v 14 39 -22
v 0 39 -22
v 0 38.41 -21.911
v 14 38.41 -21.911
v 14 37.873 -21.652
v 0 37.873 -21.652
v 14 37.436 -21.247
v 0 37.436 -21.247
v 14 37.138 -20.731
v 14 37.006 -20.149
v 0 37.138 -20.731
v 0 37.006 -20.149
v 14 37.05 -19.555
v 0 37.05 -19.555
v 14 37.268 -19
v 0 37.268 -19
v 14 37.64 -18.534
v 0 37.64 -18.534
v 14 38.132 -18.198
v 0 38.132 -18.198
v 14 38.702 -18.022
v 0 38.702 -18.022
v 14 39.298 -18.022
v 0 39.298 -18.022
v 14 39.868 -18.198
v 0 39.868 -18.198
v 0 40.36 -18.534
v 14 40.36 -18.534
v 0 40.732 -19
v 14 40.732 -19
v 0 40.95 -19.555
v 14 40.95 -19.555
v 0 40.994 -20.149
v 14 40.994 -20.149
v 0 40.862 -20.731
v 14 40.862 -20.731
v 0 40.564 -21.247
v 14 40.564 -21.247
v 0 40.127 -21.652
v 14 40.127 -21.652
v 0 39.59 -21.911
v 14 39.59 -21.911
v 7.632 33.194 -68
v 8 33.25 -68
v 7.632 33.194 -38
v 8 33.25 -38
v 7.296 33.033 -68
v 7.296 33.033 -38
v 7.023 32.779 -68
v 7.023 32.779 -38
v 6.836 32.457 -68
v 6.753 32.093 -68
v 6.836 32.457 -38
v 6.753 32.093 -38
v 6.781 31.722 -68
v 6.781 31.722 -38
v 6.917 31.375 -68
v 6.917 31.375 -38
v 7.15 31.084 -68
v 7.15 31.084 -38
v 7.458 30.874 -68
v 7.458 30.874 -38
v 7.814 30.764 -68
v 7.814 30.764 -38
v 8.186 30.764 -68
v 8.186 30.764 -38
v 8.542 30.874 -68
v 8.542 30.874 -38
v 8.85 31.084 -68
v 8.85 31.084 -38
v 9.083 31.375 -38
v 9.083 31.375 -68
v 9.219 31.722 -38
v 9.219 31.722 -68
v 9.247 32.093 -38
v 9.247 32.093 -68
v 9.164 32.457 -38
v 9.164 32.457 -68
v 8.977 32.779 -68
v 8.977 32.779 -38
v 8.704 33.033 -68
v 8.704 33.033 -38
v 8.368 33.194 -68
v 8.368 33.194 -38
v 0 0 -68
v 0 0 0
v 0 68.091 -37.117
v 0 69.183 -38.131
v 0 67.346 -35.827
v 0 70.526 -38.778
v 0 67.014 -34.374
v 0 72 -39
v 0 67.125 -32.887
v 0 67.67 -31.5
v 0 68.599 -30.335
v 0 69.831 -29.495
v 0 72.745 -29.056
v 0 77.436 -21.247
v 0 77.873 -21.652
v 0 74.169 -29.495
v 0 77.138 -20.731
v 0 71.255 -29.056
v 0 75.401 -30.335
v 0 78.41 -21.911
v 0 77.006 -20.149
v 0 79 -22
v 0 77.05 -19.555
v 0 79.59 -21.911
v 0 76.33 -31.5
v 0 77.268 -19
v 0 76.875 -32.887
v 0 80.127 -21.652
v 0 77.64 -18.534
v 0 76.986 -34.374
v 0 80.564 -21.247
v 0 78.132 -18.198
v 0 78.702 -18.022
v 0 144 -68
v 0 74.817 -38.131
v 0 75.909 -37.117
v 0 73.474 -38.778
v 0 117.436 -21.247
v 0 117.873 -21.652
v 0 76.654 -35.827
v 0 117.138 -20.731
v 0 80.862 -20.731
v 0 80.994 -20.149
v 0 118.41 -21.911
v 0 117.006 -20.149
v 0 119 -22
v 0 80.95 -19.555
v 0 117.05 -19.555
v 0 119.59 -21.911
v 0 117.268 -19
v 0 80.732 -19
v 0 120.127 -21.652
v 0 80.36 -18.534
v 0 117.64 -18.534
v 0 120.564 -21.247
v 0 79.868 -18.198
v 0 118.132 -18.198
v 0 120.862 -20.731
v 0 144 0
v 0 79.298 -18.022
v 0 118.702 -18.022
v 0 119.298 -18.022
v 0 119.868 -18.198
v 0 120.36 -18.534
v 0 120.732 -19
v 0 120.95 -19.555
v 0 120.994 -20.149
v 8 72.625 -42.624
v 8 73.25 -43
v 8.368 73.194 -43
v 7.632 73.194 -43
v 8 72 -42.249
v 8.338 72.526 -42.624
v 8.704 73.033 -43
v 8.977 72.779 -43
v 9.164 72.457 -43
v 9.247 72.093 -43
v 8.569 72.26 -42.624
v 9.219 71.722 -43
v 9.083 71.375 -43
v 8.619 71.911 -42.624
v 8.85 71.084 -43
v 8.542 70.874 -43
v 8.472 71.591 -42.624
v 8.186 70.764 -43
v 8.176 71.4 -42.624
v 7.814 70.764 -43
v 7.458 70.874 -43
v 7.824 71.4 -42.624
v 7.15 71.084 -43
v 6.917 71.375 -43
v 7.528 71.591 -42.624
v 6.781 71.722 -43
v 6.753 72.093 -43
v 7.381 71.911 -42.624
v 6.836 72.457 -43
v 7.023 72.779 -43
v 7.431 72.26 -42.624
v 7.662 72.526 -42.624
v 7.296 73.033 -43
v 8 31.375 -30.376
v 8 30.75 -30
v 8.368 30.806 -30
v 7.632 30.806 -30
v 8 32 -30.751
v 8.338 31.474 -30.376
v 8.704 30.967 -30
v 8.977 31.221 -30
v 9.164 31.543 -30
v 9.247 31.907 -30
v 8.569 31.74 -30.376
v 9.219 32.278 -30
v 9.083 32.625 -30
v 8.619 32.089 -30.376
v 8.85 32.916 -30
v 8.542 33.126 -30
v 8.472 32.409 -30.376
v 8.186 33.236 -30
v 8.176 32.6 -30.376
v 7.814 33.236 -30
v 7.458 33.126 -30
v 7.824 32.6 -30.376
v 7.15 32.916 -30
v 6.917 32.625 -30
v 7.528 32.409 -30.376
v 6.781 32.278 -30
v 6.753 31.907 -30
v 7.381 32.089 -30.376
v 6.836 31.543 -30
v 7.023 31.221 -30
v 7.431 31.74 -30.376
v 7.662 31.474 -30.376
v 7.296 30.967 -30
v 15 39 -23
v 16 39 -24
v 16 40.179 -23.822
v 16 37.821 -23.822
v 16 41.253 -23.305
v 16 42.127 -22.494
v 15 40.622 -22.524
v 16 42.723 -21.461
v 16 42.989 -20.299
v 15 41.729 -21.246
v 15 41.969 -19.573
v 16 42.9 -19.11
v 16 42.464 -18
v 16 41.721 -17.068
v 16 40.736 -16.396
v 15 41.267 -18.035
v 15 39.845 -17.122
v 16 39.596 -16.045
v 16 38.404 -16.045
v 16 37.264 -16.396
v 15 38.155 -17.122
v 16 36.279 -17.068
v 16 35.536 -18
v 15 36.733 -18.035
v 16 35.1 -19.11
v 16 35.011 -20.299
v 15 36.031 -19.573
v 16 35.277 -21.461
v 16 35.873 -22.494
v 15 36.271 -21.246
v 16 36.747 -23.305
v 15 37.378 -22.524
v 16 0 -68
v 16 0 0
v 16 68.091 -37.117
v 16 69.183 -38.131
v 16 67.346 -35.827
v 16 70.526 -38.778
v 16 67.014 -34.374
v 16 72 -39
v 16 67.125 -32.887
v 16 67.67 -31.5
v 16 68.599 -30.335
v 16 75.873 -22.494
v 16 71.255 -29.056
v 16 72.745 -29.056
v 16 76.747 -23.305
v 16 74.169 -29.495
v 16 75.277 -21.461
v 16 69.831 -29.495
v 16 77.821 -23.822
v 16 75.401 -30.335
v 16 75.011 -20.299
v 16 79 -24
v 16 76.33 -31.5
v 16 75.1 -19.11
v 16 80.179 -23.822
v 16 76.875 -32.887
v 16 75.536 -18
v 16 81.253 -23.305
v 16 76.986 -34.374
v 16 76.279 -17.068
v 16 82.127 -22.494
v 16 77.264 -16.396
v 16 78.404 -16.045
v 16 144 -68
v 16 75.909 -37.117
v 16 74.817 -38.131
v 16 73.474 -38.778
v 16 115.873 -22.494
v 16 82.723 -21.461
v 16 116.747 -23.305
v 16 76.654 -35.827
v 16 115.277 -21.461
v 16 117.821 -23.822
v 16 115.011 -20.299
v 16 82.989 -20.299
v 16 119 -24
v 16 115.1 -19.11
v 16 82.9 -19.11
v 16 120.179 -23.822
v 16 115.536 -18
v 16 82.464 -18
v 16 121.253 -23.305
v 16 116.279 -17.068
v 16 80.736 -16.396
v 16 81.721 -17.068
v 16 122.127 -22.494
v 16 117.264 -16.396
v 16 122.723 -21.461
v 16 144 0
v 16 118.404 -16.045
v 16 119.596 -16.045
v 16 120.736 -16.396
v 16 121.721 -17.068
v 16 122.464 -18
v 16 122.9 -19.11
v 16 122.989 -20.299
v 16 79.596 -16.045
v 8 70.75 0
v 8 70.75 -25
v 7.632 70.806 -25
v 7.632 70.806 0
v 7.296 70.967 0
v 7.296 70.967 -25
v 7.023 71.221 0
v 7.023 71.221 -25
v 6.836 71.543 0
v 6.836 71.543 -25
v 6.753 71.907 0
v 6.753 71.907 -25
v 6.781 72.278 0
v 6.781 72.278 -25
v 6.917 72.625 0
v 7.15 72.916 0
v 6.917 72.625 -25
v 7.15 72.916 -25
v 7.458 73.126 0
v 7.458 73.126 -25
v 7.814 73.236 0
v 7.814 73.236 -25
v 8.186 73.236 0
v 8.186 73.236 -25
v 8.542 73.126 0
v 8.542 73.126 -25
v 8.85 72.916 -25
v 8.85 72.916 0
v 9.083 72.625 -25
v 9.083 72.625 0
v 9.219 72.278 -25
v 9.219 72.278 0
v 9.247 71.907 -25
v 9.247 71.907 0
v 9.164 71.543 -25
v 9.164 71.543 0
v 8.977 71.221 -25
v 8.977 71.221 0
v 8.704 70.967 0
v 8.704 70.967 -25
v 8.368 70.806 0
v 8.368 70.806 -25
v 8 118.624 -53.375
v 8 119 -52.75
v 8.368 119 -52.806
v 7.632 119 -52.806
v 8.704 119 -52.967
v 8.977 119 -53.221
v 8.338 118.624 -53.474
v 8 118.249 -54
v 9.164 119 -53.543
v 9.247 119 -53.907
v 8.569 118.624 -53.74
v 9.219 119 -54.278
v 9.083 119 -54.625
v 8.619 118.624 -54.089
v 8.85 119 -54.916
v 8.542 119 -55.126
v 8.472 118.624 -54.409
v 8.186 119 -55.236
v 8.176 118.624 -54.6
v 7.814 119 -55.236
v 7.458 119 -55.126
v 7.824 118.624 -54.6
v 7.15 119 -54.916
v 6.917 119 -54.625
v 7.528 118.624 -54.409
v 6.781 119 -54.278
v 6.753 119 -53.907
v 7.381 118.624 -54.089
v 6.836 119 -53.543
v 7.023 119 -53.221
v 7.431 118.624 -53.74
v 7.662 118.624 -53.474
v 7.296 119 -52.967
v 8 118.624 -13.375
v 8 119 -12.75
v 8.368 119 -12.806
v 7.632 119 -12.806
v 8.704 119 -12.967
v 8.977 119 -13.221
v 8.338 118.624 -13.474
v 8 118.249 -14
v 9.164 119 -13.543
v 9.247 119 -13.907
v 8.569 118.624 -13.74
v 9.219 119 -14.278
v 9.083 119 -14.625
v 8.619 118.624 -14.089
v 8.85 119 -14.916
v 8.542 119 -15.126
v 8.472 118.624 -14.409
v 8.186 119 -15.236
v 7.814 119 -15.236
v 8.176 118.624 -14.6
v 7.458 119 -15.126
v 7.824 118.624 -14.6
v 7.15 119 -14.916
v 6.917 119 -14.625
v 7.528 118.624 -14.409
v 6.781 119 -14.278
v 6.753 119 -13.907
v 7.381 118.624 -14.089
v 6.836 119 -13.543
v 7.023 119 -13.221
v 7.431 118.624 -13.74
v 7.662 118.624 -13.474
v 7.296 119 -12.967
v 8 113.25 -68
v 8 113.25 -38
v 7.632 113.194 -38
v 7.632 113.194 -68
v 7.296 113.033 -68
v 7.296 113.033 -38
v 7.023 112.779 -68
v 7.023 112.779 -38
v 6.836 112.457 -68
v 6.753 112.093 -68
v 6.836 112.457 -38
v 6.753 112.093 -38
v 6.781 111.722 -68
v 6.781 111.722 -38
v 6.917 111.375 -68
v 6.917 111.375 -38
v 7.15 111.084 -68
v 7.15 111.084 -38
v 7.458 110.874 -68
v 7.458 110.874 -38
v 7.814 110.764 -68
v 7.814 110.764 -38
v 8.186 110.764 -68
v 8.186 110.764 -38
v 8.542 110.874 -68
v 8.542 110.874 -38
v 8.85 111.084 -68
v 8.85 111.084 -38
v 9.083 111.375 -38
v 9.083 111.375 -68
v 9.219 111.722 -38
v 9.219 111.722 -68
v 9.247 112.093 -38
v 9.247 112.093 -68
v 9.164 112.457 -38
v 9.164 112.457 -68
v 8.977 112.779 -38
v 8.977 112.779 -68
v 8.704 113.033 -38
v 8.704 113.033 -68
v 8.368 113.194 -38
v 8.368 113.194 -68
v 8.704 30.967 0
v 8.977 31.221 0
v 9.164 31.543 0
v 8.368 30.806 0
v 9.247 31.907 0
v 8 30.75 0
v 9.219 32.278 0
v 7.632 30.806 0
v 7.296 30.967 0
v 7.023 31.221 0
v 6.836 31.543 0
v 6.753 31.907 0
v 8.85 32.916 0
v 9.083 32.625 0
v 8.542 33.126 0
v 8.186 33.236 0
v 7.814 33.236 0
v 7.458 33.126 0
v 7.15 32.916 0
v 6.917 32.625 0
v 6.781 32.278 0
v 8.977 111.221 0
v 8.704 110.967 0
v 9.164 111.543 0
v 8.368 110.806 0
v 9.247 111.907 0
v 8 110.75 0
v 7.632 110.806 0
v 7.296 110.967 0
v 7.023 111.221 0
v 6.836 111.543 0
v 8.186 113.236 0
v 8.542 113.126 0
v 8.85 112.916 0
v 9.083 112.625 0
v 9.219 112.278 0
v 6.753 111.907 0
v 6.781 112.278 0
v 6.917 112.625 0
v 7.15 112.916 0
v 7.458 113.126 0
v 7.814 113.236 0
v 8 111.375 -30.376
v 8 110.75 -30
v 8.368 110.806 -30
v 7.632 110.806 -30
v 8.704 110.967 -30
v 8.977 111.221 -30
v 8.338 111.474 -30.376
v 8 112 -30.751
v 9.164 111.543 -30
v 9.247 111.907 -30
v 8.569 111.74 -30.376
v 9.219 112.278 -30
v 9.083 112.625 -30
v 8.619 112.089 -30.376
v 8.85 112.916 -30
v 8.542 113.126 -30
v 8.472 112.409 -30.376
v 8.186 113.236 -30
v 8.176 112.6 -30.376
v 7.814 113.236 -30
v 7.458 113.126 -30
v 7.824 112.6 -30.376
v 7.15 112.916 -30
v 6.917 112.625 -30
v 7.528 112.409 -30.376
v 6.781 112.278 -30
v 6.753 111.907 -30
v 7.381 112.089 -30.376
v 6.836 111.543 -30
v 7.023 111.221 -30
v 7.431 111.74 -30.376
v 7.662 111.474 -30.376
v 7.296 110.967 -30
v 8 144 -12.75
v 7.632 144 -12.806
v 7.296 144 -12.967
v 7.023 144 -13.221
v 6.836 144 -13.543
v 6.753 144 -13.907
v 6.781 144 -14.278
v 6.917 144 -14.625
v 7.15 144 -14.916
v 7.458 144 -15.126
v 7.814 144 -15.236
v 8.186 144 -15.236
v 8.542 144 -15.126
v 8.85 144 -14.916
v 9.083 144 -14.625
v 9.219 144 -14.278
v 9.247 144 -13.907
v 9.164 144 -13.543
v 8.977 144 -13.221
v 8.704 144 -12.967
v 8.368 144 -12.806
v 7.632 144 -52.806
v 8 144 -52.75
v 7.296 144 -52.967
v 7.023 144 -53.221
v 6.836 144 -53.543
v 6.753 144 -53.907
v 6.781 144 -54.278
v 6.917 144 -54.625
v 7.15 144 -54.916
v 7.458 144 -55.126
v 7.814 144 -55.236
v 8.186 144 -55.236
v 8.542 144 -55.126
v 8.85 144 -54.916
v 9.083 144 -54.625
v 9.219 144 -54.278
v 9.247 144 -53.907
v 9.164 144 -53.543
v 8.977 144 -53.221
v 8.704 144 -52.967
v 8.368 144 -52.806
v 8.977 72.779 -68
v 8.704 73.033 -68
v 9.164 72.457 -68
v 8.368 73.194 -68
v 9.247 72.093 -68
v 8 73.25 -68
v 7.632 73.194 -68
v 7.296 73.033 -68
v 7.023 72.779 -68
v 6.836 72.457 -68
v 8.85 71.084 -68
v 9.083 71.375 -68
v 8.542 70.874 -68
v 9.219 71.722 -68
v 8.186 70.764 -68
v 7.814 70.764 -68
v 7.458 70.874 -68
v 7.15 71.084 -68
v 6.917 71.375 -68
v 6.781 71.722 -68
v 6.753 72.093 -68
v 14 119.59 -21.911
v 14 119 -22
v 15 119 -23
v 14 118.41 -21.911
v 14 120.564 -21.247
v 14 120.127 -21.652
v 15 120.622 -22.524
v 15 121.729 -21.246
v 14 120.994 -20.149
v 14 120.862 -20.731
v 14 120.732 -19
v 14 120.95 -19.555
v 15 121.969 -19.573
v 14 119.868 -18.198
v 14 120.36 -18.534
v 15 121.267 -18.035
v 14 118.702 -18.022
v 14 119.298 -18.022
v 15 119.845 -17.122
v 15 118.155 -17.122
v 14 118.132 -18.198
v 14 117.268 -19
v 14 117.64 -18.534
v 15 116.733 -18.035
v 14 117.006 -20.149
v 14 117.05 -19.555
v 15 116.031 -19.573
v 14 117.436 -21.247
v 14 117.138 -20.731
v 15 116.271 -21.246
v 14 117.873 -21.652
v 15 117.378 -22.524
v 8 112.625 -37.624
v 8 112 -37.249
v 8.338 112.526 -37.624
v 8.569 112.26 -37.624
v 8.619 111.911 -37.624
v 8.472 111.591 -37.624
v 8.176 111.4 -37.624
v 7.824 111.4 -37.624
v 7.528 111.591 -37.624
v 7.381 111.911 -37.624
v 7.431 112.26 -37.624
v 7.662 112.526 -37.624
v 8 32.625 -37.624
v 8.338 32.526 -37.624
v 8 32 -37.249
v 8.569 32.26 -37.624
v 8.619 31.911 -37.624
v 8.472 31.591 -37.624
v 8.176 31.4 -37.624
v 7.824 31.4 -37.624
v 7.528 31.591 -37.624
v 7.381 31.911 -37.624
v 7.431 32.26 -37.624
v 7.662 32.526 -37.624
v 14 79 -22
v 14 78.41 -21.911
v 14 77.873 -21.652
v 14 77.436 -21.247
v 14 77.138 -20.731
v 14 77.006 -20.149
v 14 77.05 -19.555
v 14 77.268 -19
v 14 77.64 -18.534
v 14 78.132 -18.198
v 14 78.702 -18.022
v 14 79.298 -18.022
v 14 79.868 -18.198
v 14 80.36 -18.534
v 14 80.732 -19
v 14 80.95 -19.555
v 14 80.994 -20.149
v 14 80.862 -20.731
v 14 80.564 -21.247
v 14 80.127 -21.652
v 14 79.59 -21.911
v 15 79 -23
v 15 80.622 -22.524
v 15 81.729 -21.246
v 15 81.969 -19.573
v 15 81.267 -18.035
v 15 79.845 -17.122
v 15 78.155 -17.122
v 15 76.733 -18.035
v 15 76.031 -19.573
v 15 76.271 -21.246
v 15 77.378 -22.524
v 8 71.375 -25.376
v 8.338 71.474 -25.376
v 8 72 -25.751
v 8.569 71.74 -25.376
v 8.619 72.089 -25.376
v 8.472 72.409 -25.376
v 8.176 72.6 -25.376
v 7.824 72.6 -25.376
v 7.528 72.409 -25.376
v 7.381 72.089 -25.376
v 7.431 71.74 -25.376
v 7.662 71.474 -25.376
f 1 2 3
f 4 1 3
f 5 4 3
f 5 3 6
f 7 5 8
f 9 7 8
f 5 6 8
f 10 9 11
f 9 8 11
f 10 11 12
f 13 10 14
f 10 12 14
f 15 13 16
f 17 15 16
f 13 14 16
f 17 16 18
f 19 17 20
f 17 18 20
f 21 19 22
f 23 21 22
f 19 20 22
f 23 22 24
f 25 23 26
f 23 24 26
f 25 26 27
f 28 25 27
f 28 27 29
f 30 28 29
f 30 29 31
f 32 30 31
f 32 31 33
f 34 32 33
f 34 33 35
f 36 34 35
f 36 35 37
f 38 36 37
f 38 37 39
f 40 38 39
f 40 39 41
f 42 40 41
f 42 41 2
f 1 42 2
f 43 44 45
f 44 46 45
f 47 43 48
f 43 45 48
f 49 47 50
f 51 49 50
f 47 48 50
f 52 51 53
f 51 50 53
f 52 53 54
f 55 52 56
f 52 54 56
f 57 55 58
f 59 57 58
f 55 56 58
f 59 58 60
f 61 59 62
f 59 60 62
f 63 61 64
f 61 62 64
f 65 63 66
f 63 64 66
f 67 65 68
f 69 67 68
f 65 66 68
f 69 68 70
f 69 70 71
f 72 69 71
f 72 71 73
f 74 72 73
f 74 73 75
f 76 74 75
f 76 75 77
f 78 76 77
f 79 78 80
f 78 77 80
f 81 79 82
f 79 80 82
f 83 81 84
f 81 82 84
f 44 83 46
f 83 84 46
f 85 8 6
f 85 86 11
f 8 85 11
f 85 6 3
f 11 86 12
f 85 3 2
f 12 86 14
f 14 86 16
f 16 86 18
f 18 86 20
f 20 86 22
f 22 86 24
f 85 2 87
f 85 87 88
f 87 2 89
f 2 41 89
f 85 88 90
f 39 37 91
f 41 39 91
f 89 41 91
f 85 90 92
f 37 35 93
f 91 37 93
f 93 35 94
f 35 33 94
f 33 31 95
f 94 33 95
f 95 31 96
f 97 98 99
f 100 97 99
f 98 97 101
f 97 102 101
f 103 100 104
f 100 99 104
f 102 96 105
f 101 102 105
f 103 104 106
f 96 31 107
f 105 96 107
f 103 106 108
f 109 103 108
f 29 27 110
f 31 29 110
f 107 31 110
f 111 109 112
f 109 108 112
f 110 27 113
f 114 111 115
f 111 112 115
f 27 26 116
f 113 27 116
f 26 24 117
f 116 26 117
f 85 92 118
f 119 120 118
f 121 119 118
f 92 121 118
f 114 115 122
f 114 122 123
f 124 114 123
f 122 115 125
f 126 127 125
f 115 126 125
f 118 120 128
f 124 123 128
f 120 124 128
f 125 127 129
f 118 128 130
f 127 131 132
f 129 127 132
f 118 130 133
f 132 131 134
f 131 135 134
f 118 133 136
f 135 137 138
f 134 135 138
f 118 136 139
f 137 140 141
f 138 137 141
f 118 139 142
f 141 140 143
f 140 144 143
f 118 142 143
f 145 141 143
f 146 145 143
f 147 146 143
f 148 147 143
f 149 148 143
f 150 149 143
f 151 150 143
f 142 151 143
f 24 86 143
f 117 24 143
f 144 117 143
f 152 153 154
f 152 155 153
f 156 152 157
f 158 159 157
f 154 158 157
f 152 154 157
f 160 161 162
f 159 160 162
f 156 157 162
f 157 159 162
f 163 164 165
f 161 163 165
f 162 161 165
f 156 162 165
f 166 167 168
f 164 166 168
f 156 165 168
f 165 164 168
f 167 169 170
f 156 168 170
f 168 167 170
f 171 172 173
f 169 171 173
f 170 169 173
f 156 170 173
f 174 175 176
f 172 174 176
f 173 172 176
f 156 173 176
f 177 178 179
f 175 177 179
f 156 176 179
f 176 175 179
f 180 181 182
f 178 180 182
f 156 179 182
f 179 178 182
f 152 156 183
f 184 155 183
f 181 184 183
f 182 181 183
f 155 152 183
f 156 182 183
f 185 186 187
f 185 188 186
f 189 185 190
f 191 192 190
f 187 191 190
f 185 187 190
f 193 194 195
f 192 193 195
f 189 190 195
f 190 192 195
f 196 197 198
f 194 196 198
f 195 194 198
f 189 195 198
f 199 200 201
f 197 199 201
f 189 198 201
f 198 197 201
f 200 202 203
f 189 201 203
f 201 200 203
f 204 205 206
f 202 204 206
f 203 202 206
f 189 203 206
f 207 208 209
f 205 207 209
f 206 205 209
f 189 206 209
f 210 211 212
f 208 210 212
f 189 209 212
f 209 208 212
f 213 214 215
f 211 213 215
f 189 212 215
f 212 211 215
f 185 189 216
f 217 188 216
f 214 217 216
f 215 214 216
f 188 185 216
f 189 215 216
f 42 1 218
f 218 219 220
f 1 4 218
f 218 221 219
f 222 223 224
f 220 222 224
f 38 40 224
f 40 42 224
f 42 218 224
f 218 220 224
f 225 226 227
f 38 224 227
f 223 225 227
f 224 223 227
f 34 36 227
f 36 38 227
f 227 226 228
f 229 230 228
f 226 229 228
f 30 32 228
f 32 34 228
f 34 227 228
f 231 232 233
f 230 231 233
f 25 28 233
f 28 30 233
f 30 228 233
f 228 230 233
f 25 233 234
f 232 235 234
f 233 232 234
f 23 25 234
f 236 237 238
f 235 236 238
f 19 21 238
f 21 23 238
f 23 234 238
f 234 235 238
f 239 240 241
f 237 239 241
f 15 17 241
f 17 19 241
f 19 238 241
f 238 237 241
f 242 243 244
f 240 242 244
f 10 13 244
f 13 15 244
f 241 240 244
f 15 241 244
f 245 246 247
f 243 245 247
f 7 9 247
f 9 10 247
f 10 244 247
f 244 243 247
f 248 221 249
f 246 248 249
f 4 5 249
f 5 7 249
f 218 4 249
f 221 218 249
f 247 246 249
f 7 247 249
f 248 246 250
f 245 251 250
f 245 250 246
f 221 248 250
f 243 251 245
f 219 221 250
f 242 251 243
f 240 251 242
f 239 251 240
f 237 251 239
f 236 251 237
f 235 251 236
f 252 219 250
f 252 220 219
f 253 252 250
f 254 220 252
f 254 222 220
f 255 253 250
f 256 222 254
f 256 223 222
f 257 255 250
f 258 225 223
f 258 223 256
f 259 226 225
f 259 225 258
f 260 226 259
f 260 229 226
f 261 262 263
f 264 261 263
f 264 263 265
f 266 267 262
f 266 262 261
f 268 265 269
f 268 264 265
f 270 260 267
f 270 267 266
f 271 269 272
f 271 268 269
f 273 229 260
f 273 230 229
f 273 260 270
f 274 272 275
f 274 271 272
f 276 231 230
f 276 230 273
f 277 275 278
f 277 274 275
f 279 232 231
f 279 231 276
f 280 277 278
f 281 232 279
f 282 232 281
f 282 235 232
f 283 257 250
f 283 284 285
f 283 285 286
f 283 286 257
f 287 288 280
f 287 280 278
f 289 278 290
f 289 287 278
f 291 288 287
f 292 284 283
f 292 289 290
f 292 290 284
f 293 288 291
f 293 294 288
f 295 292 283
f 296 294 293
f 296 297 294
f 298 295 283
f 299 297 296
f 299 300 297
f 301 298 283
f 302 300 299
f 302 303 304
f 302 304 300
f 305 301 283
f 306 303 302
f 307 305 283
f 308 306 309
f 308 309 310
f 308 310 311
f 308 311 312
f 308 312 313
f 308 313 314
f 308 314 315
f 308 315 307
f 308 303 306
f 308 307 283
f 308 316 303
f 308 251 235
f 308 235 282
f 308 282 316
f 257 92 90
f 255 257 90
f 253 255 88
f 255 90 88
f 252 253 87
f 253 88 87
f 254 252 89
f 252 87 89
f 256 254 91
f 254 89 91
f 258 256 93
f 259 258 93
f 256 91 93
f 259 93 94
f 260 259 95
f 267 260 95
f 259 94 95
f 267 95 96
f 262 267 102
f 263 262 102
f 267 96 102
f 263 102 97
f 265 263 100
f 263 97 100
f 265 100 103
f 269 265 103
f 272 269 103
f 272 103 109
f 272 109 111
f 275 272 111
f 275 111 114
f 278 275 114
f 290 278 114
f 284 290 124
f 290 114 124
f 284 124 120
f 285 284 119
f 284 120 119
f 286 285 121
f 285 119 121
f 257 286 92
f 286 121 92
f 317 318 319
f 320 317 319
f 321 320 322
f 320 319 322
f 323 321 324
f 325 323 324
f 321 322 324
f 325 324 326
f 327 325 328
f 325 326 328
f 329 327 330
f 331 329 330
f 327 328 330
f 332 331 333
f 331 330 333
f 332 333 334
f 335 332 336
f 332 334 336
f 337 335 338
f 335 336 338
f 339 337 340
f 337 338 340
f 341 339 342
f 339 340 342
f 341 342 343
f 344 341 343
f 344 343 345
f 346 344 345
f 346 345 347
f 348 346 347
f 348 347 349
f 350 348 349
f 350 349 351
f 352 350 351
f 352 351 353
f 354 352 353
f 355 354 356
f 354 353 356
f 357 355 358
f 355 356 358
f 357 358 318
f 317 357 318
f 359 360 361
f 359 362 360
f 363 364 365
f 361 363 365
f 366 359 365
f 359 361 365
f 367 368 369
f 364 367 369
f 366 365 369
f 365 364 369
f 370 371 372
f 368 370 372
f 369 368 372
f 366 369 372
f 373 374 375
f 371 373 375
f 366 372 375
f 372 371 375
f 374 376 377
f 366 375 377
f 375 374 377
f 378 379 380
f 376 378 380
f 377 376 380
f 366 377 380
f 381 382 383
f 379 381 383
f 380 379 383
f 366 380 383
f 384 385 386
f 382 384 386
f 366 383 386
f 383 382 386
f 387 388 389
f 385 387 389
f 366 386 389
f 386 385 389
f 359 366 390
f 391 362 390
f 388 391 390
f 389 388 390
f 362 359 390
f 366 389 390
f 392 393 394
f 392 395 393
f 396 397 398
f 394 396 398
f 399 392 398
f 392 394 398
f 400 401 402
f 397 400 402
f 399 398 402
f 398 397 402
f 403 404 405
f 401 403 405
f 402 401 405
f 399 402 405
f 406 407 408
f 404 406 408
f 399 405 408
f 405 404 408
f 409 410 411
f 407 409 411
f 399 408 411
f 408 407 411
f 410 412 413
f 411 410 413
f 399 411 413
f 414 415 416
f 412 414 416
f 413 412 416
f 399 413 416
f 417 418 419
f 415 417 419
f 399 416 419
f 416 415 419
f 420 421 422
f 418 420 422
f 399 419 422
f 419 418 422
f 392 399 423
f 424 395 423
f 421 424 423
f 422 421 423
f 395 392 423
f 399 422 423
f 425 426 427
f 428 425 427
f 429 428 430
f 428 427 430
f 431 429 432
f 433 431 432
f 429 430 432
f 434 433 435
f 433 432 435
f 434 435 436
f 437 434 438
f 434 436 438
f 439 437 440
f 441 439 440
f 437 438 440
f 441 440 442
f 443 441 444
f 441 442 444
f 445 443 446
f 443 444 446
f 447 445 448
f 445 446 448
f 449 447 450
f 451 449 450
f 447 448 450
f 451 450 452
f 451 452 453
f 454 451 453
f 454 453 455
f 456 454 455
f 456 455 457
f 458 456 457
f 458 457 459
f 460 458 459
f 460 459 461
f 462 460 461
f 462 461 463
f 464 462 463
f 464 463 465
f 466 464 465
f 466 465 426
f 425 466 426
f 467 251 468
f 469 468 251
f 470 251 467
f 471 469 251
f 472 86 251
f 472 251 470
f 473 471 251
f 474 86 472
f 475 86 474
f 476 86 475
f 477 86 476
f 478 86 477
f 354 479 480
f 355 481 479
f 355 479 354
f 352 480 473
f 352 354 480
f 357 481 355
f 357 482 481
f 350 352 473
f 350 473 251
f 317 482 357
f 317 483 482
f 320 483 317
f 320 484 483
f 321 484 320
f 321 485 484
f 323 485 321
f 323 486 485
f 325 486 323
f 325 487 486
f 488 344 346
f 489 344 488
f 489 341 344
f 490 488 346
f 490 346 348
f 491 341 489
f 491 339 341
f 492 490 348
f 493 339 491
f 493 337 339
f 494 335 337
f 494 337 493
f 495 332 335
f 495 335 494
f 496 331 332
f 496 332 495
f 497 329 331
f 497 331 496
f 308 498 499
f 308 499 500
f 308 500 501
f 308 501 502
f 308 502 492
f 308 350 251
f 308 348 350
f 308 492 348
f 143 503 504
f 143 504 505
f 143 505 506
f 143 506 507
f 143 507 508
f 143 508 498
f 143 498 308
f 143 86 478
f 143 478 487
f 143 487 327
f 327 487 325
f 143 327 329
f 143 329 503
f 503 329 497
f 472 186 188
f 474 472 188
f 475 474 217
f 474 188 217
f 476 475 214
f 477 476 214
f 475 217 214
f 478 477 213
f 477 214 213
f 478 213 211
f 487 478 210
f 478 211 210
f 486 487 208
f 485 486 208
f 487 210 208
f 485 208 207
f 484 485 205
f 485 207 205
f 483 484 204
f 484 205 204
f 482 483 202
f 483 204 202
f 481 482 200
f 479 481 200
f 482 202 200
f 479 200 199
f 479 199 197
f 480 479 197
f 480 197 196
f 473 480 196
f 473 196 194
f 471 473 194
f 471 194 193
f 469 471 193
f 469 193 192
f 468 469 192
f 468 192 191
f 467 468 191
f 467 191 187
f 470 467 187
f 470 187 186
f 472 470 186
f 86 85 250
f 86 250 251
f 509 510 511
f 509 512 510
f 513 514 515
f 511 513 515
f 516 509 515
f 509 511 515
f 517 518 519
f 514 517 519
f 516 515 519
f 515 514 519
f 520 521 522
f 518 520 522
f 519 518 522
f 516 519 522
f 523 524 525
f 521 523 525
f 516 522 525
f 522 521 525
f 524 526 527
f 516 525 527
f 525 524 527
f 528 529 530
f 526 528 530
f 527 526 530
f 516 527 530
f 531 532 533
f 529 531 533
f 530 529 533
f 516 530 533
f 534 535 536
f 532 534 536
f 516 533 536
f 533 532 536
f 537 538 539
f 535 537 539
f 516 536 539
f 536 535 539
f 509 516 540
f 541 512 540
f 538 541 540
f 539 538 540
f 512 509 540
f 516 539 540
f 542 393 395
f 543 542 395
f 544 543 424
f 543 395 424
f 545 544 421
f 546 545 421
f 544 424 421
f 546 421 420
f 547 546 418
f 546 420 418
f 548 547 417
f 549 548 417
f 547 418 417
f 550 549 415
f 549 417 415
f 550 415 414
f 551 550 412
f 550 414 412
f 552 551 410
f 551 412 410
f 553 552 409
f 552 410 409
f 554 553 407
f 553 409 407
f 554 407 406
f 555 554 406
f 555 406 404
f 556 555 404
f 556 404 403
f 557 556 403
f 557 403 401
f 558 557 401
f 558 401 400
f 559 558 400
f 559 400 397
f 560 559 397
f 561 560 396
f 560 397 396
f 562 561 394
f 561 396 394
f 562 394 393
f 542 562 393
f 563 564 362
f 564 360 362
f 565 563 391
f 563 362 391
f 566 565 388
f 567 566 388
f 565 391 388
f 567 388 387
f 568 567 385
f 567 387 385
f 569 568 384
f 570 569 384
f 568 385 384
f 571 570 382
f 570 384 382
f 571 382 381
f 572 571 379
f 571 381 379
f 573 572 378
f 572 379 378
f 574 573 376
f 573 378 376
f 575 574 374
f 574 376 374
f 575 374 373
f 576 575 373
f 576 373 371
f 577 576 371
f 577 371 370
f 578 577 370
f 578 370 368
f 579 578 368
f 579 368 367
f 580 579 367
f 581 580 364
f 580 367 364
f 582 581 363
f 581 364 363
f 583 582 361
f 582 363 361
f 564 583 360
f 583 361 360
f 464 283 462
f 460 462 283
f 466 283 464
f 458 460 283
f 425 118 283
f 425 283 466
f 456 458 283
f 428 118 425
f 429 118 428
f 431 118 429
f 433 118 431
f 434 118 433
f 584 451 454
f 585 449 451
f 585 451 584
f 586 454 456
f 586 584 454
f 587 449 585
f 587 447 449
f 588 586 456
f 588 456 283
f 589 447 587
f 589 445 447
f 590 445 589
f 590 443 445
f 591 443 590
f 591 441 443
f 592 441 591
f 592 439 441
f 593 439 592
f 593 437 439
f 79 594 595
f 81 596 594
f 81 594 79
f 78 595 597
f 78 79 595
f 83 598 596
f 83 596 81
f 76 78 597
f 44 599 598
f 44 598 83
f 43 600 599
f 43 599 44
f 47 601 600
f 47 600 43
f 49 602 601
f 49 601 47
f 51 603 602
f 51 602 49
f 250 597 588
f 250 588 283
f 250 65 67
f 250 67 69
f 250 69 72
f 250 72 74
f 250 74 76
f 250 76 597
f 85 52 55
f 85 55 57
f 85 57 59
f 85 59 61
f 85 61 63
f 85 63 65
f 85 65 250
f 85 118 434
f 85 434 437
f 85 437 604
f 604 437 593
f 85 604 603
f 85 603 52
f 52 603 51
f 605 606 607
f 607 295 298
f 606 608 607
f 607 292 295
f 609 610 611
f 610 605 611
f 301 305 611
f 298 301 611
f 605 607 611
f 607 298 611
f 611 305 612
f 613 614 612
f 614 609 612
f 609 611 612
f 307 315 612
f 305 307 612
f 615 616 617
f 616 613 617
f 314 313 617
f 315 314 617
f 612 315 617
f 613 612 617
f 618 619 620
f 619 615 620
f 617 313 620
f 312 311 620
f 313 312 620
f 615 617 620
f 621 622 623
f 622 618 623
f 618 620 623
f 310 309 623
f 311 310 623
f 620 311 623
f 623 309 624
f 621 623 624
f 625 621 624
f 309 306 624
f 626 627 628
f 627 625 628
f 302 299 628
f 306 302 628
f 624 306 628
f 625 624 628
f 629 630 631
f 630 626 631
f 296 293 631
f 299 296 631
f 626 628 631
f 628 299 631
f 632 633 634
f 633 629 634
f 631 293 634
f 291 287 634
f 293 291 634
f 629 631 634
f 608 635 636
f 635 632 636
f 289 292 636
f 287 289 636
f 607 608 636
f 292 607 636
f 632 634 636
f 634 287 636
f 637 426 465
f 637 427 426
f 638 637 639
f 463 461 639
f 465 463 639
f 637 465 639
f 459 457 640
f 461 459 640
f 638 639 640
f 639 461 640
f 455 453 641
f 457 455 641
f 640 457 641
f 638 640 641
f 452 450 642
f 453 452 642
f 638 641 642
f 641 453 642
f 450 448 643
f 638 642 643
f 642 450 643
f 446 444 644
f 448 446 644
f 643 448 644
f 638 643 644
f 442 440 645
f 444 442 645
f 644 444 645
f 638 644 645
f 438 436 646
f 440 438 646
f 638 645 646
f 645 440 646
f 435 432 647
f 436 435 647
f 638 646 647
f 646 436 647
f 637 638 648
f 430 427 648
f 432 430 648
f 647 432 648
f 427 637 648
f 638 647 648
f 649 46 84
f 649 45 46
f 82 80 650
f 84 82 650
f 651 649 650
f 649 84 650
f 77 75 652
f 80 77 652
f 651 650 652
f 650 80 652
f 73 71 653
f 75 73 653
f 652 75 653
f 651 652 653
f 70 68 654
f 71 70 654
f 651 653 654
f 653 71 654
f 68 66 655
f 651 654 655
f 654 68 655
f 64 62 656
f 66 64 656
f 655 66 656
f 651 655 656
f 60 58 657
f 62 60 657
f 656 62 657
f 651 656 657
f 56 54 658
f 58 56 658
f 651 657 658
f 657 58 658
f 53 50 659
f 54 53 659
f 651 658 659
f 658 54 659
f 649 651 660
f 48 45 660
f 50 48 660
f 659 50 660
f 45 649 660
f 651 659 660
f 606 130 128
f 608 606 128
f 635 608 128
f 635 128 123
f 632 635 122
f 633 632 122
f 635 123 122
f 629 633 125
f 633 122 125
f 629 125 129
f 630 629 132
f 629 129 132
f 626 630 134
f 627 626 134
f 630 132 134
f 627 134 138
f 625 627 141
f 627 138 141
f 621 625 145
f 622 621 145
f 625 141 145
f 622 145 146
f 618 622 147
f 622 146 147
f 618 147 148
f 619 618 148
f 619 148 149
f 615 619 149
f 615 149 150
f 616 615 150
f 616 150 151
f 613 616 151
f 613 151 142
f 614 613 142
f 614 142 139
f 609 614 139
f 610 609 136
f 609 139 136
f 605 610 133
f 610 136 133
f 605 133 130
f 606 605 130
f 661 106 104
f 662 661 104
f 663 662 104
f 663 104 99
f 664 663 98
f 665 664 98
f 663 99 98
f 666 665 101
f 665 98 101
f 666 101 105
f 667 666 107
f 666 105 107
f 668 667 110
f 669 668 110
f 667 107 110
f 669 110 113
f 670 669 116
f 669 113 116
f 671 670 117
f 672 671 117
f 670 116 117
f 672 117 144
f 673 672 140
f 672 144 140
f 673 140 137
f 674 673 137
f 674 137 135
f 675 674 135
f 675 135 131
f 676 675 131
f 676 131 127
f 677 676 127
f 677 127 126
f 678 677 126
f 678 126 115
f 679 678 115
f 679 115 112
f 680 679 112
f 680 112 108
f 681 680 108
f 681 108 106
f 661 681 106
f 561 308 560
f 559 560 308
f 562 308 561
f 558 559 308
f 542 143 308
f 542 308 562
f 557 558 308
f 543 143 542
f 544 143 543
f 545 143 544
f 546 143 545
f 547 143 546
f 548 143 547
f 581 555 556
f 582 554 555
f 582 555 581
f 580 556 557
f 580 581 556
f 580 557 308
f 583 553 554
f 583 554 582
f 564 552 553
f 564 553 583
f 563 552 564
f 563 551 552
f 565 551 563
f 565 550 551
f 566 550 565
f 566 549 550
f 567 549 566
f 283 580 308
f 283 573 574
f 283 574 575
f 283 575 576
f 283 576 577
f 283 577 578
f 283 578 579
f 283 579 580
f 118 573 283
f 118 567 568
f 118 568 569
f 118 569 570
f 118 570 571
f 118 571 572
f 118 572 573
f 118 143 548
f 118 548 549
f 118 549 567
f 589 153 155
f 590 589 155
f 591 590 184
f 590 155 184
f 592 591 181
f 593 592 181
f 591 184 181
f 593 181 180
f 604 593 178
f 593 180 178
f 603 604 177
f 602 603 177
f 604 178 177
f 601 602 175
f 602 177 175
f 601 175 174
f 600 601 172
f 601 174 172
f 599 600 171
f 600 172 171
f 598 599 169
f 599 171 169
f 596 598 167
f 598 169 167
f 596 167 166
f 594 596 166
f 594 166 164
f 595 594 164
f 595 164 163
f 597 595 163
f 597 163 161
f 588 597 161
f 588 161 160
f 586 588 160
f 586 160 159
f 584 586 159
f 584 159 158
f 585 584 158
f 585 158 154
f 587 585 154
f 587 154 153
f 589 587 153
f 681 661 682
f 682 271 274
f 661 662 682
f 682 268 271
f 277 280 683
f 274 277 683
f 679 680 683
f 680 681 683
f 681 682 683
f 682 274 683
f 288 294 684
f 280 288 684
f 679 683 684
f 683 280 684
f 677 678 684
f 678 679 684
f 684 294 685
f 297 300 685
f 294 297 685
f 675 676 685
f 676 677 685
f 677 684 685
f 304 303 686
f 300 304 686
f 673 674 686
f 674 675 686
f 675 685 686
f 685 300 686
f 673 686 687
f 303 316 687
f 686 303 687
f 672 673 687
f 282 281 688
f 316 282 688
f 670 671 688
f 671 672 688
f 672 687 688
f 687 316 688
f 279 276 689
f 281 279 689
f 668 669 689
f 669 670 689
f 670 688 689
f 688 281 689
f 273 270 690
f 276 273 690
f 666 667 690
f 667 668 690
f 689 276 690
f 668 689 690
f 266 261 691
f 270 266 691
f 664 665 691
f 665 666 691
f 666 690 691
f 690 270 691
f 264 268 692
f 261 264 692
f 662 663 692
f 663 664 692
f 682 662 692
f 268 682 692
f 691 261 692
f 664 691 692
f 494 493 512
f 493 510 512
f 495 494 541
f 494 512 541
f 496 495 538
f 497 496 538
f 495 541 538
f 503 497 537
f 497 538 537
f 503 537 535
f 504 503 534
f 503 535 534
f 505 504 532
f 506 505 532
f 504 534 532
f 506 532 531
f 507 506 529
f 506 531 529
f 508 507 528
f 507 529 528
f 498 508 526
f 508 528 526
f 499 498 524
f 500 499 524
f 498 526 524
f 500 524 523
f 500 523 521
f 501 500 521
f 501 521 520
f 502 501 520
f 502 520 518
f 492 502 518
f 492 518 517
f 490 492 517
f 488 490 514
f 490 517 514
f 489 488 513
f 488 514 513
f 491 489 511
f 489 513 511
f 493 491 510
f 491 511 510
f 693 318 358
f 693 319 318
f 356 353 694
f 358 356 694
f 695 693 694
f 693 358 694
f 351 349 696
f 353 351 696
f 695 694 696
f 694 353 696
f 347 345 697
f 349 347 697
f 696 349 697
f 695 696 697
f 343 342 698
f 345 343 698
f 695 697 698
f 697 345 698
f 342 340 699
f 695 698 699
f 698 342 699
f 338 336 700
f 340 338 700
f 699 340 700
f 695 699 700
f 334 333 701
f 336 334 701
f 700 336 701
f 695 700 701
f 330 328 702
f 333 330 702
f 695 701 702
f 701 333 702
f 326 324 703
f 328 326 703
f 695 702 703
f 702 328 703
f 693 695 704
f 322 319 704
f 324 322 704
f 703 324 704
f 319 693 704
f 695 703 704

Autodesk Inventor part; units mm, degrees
ref_plane "YZ Plane" through (0, 0, 0) normal (1, 0, 0) x (0, 1, 0)
ref_plane "XZ Plane" through (0, 0, 0) normal (0, 1, 0) x (-1, 0, 0)
ref_plane "XY Plane" through (0, 0, 0) normal (0, 0, 1) x (1, 0, 0)
sketch "Skizze1" plane through (0, 0, 0) normal (1, 0, 0) x (0, 1, 0)
  line L0 (0, 0) -> (144, 0)
  line L1 (144, 0) -> (144, -68)
  line L2 (144, -68) -> (0, -68)
  line L3 (0, -68) -> (0, 0)
  dimension "d0" = 144
  dimension "d1" = 68
extrude "Extrusion1" add sketch "Skizze1" along normal blind 16
sketch "Skizze2" plane through (0, 0, 0) normal (0, 0, 1) x (1, 0, 0)
  line L0 (0, 0) -> (0, 144) construction
  line L1 (0, 72) -> (16, 72) construction
  line L2 (16, 144) -> (16, 0) construction
  line L3 (0, 144) -> (16, 144) construction
  line L4 (8, 144) -> (8, 0) construction
  line L5 (0, 144) -> (16, 144) construction
  line L6 (0, 0) -> (16, 0) construction
  line L7 (0, 144) -> (16, 144) construction
  line L8 (16, 144) -> (16, 0) construction
  line L9 (16, 0) -> (0, 0) construction
  line L10 (0, 0) -> (0, 144) construction
  line L11 (0, 112) -> (16, 112) construction
  line L12 (0, 32) -> (16, 32) construction
  point P0 (8, 112)
  point P1 (8, 72)
  point P2 (8, 32)
  dimension "d4" = 40
  dimension "d5" = 40
hole "Bohrung1" at (8, 112, 0) at (8, 32, 0) direction (0, 0, -1) diameter 2.5 depth 30 tip angle 118
sketch "Skizze3" plane through (0, 144, 0) normal (0, 1, 0) x (1, 0, 0)
  line L0 (0, 0) -> (16, 0)
  line L1 (16, 0) -> (16, 68)
  line L2 (16, 68) -> (0, 68)
  line L3 (0, 68) -> (0, 0)
  line L4 (8, 0) -> (8, 68) construction
  line L5 (0, 68) -> (16, 68) construction
  line L6 (16, 0) -> (16, 68) construction
  line L7 (16, 34) -> (0, 34) construction
  line L8 (0, 68) -> (0, 0) construction
  line L9 (0, 14) -> (16, 14) construction
  line L10 (0, 54) -> (16, 54) construction
  point P0 (8, 14)
  point P1 (8, 54)
  dimension "d13" = 14
  dimension "d22" = 14
hole "Bohrung2" at (8, 144, -14) at (8, 144, -54) direction (0, -1, 0) diameter 2.5 depth 25 tip angle 118
sketch "Skizze4" plane through (0, 0, -68) normal (0, 0, -1) x (-1, 0, 0)
  line L0 (0, 0) -> (-16, 0) construction
  line L1 (-16, 0) -> (-16, 144) construction
  line L2 (-16, 144) -> (0, 144) construction
  line L3 (0, 144) -> (0, 0) construction
  line L4 (-8, 0) -> (-8, 144) construction
  line L5 (-16, 144) -> (-16, 0) construction
  line L6 (-16, 72) -> (0, 72) construction
  point P0 (-8, 112)
  point P1 (-8, 32)
  dimension "d53" = 72
  dimension "d54" = 40
  dimension "d55" = 40
hole "Bohrung3" at (8, 112, -68) at (8, 32, -68) direction (0, 0, 1) diameter 2.5 depth 30 tip angle 118
sketch "Skizze5" plane through (16, 0, 0) normal (1, 0, 0) x (0, 0, -1)
  line L0 (68, 144) -> (0, 144) construction
  line L1 (0, 144) -> (0, 0) construction
  line L2 (0, 0) -> (68, 0) construction
  line L3 (68, 0) -> (68, 144) construction
  line L4 (0, 144) -> (0, 0) construction
  line L5 (0, 72) -> (68, 72) construction
  circle A0 centre (34, 72) radius 4 construction
  line L6 (20, 119) -> (20, 39) construction
  point P0 (20, 79)
  dimension "d41" = 8
  dimension "d42" = 7
  dimension "d43" = 40
  dimension "d44" = 40
  dimension "d45" = 20
hole "Bohrung4" at (16, 39, -20) at (16, 79, -20) at (16, 119, -20) direction (-1, 0, 0) diameter 4 end through all countersink diameter 8 countersink angle 90
hole "Bohrung5" at (16, 72, -34) direction (-1, 0, 0) diameter 10 end through all
sketch "Skizze6" plane through (0, 0, 0) normal (0, 0, 1) x (1, 0, 0)
  circle A0 centre (8, 112) radius 1.25 projected
  circle A1 centre (8, 32) radius 1.25 projected
  line L0 (0, 0) -> (0, 144) projected
  line L1 (0, 0) -> (16, 0) projected
  line L2 (16, 144) -> (16, 0) projected
  line L3 (0, 144) -> (16, 144) projected
  point P0 (8, 72)
  dimension "d56" = 40
hole "Bohrung6" at (8, 72, 0) direction (0, 0, -1) diameter 2.5 depth 25 tip angle 118
sketch "Skizze7" plane through (0, 0, -68) normal (0, 0, -1) x (-1, 0, 0)
  circle A0 centre (-8, 72) radius 1.25 projected
  point P0 (0, 0)
hole "Bohrung7" at (8, 72, -68) direction (0, 0, 1) diameter 2.5 depth 25 tip angle 118
equation "\"d39\" = Stärke"
equation "\"d51\" = Stärke"
equation "\"Biegeradius\" = Stärke"
equation "\"BreiteBiegungsfreistellung\" = Stärke"
equation "\"TiefeBiegungsfreistellung\" = 0.5 * Stärke"
equation "\"GrößeEckenfreistellung\" = 4 * Stärke"
equation "\"MinimalRest\" = 2 * Stärke"
equation "\"Übergangsradius\" = Biegeradius"
equation "\"JacobiRadiusGröße\" = Biegeradius"
equation "\"Abstandsgröße\" = Stärke"
equation "\"Stärke\" = 0.5"
properties part number "licht_150_side_right" material "Spanplatte"
